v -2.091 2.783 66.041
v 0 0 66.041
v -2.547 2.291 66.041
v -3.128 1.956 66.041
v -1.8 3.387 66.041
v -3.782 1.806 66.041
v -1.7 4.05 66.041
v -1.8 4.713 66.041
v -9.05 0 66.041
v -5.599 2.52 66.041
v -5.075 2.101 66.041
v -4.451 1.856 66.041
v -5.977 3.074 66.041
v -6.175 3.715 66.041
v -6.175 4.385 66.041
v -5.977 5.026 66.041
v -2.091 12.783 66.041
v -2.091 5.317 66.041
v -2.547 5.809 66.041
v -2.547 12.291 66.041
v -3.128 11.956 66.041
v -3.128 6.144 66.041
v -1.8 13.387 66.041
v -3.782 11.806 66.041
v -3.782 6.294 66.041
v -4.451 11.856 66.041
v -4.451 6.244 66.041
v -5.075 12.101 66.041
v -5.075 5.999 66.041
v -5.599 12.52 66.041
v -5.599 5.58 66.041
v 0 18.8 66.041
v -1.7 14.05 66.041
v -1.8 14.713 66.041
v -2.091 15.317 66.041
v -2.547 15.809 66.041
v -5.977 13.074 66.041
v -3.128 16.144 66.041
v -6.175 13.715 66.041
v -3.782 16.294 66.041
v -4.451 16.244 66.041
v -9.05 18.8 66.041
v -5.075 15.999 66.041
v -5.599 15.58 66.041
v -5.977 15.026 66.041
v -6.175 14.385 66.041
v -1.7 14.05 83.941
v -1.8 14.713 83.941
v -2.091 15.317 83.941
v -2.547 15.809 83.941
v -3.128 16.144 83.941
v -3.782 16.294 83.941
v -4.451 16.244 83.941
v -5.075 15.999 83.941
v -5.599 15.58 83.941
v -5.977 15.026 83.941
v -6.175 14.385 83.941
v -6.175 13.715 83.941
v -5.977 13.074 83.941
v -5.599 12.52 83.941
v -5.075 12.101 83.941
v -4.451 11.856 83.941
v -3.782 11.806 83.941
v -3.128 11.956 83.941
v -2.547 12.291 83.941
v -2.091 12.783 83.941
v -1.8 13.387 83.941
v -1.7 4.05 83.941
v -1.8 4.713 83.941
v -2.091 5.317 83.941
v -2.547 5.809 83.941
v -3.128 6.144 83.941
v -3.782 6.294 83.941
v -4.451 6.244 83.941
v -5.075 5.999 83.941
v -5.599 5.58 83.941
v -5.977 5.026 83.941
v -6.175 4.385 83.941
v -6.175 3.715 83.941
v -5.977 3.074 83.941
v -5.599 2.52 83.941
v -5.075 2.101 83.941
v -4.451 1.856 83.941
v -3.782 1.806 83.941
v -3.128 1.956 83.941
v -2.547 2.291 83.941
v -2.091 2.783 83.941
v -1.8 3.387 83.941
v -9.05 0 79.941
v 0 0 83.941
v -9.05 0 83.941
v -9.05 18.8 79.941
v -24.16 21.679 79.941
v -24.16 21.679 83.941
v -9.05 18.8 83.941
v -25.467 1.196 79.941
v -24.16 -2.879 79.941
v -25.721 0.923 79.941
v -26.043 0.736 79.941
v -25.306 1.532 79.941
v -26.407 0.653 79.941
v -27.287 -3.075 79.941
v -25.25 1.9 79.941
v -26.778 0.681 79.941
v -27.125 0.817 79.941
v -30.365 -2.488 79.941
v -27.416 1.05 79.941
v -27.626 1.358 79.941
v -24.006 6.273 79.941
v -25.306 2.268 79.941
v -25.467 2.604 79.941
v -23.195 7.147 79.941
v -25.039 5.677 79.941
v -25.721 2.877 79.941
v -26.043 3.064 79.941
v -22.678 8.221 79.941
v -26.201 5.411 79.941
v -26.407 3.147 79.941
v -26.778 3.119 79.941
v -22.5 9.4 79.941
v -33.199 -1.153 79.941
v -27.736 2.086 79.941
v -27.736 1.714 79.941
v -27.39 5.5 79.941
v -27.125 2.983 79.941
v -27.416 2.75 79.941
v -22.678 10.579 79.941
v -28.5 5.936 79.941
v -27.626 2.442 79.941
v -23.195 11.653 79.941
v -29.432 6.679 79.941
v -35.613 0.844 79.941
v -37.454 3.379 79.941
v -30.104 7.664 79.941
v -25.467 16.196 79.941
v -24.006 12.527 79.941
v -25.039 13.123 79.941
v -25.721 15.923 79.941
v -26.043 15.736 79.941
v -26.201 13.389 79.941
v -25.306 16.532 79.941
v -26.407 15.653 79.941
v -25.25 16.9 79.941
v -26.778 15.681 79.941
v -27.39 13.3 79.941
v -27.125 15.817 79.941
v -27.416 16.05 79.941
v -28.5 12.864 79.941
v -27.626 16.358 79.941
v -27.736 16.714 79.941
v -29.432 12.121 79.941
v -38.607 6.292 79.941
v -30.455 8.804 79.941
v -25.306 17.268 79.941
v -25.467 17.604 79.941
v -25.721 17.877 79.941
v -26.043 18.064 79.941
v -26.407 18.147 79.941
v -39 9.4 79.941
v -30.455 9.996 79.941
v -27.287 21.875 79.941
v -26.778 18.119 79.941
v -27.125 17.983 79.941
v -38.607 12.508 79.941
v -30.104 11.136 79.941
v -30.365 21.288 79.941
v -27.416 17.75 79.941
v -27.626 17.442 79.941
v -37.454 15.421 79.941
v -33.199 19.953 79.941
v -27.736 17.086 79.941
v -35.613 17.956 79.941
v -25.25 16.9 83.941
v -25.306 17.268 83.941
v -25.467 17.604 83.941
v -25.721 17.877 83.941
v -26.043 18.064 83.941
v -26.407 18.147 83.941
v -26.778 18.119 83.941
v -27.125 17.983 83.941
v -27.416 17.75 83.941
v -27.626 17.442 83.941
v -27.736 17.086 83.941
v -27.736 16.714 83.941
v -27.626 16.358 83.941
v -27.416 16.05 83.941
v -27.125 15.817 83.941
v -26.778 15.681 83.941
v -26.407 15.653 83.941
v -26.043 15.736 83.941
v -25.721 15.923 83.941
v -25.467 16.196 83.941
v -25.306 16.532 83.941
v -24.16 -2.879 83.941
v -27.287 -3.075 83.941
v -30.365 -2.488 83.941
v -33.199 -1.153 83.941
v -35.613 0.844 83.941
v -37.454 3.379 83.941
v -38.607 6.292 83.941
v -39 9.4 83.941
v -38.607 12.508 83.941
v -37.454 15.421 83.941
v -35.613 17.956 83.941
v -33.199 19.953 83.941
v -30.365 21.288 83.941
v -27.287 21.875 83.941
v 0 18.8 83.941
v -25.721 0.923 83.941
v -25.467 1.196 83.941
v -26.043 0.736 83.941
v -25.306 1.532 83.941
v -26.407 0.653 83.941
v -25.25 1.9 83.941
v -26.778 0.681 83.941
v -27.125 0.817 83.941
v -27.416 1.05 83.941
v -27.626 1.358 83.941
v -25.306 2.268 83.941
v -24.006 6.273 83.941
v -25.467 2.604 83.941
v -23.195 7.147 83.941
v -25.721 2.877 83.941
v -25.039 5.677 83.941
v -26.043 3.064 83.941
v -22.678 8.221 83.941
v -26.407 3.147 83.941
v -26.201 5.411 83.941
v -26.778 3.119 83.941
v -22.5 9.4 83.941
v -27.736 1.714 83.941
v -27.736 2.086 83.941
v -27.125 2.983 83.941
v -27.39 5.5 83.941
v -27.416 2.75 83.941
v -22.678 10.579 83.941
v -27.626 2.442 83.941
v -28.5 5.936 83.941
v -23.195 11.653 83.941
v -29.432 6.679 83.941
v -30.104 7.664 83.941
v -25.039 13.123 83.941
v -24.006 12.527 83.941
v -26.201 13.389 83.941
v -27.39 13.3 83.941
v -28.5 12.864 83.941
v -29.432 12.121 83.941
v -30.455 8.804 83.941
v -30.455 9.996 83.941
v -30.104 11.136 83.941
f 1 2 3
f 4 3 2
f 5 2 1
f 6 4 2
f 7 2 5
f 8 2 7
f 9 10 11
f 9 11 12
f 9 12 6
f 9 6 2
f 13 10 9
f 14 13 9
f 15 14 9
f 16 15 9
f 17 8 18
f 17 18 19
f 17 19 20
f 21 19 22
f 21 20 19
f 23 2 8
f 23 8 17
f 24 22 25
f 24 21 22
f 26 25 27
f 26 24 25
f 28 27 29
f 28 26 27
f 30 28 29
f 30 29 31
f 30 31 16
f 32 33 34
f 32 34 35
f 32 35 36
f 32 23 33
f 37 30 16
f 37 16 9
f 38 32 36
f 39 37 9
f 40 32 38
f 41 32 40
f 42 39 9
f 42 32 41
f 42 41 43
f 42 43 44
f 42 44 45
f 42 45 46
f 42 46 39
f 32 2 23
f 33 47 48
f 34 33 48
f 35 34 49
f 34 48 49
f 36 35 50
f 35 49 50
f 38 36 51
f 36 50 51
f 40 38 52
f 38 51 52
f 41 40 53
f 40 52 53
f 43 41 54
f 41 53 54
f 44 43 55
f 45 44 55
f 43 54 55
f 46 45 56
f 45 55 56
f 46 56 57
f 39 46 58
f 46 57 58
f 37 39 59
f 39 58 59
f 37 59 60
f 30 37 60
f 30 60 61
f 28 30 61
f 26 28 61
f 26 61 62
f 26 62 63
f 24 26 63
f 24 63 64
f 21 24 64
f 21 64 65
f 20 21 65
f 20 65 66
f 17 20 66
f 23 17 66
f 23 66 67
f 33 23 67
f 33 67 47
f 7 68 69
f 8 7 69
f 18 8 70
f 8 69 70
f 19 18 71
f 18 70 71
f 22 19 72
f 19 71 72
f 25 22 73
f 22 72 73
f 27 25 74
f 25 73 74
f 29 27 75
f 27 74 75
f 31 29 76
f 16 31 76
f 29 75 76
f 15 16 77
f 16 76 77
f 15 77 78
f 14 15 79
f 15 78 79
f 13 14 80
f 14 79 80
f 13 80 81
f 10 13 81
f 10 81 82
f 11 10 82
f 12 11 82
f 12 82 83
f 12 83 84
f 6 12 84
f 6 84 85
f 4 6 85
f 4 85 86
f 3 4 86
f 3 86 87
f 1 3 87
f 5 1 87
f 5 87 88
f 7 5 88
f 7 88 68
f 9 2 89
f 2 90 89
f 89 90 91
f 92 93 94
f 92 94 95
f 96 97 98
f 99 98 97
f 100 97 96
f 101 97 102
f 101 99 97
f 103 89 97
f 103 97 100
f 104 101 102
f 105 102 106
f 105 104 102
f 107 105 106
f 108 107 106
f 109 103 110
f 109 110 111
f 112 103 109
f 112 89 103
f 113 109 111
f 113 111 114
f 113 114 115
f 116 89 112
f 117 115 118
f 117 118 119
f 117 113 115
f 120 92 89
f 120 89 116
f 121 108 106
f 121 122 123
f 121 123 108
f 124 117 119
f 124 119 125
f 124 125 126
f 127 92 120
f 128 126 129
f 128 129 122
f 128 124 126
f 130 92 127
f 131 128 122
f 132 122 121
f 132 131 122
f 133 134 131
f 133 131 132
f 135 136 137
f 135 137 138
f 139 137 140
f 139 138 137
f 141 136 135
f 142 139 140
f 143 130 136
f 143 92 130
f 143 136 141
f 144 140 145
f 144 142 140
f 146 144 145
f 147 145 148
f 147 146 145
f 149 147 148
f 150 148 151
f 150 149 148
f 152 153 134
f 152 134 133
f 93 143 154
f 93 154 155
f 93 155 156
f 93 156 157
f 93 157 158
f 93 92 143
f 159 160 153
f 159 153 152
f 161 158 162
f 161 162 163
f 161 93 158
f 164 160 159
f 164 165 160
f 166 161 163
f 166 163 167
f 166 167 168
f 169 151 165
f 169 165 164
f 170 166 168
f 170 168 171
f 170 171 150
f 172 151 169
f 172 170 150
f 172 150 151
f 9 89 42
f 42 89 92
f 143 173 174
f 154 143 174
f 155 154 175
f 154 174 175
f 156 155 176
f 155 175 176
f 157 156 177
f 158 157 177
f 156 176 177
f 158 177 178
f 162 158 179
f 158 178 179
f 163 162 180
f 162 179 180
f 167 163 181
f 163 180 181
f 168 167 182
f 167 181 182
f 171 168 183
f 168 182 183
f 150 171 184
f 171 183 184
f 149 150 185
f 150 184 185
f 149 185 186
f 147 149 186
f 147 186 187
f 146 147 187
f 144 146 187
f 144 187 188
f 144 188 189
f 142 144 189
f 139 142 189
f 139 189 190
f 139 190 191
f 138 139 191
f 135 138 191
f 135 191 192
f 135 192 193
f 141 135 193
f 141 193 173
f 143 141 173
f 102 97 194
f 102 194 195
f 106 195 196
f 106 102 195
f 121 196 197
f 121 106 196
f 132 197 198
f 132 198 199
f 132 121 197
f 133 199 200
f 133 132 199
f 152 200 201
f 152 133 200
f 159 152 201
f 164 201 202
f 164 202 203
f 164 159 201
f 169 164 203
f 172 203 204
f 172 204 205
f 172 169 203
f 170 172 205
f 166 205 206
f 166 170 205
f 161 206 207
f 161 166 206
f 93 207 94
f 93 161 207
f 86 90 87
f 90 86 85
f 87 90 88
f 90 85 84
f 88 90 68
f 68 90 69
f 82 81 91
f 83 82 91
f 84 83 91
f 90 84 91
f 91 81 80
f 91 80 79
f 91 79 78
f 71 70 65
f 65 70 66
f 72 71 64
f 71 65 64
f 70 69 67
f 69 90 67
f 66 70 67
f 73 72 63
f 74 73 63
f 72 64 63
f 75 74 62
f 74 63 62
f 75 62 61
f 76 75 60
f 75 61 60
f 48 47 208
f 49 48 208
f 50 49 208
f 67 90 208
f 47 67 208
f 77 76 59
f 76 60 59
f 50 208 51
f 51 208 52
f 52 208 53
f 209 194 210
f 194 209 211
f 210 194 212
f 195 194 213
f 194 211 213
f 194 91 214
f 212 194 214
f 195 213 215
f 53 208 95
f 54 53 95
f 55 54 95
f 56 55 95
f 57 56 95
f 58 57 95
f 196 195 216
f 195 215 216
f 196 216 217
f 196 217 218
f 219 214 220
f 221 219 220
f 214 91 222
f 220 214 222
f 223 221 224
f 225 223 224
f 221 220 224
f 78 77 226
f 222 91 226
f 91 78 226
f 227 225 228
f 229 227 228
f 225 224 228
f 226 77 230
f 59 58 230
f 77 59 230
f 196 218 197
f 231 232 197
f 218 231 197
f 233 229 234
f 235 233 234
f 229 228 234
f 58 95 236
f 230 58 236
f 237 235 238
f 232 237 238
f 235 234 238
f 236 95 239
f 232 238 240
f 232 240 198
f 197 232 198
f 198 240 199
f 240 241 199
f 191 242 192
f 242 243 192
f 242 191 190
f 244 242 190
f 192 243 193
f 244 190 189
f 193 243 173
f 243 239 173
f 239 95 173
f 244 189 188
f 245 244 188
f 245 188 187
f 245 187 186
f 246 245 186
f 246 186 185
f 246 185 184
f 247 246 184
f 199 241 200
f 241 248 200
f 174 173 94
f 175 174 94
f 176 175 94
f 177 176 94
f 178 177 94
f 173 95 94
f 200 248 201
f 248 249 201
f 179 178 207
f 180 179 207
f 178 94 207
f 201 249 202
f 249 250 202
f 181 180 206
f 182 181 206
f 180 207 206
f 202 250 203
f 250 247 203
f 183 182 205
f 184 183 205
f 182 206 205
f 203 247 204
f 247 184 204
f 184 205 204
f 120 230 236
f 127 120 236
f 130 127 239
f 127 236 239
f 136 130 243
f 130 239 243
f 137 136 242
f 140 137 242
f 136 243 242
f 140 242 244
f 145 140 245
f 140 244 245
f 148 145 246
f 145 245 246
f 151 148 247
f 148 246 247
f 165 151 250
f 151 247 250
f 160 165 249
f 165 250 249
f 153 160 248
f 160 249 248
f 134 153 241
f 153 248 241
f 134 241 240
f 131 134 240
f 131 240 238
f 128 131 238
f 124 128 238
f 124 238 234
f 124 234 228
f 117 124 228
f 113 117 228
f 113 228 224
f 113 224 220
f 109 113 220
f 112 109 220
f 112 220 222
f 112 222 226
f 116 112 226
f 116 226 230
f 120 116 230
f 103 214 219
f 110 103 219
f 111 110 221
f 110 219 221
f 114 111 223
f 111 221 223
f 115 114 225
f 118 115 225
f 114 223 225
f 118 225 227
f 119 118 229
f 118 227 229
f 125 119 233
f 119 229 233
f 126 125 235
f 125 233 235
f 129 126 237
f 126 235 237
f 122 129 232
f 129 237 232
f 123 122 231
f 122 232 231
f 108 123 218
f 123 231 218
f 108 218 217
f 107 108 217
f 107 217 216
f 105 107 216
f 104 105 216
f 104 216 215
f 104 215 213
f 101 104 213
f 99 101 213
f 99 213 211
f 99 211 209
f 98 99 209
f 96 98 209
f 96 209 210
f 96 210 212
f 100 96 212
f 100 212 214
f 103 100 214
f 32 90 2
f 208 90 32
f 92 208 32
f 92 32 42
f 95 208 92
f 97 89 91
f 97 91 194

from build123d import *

# Parameters (mm, degrees)
BOSS_EXTRUDE1_DEPTH = 4.000000656
SKETCH2_W           = 9.05
SKETCH2_H           = 18.8
BOSS_EXTRUDE2_DEPTH = 13.9
SKETCH3_R           = 4
SKETCH3_R_2         = 2.25
SKETCH3_R_3         = 1.25
CUT_EXTRUDE1_DEPTH  = 30


with BuildPart() as part:
    # Sketch1 → Boss-Extrude1 (new body)
    with BuildSketch(Plane(origin=(0, 0, 79.940542579), x_dir=(-1, 0, 0), z_dir=(0, 0, -1))):
        with BuildLine():
            Line((9.05, 0), (24.160371291, -2.879093513))
            ThreePointArc((24.160371291, -2.879093513), (39, 9.4), (24.160371291, 21.679093513))
            Line((24.160371291, 21.679093513), (9.05, 18.8))
            Line((9.05, 18.8), (0, 18.8))
            Line((0, 18.8), (0, 0))
            Line((0, 0), (9.05, 0))
        make_face()
    extrude(amount=-BOSS_EXTRUDE1_DEPTH)

    # Sketch2 → Boss-Extrude2 (add)
    with BuildSketch(Plane(origin=(0, 0, 79.940542579), x_dir=(-1, 0, 0), z_dir=(0, 0, -1))):
        with Locations((4.525, 9.4)):
            Rectangle(SKETCH2_W, SKETCH2_H)
    extrude(amount=BOSS_EXTRUDE2_DEPTH)

    # Sketch3 → Cut-Extrude1 (cut)
    with BuildSketch(Plane.XY.offset(83.940543234)):
        with Locations((-26.5, 9.4)):
            Circle(SKETCH3_R)
        with Locations((-3.95, 14.05)):
            Circle(SKETCH3_R_2)
        with Locations((-3.95, 4.05)):
            Circle(SKETCH3_R_2)
        with Locations((-26.5, 16.9)):
            Circle(SKETCH3_R_3)
        with Locations((-26.5, 1.9)):
            Circle(SKETCH3_R_3)
    extrude(amount=-CUT_EXTRUDE1_DEPTH, mode=Mode.SUBTRACT)


solid = part.part
